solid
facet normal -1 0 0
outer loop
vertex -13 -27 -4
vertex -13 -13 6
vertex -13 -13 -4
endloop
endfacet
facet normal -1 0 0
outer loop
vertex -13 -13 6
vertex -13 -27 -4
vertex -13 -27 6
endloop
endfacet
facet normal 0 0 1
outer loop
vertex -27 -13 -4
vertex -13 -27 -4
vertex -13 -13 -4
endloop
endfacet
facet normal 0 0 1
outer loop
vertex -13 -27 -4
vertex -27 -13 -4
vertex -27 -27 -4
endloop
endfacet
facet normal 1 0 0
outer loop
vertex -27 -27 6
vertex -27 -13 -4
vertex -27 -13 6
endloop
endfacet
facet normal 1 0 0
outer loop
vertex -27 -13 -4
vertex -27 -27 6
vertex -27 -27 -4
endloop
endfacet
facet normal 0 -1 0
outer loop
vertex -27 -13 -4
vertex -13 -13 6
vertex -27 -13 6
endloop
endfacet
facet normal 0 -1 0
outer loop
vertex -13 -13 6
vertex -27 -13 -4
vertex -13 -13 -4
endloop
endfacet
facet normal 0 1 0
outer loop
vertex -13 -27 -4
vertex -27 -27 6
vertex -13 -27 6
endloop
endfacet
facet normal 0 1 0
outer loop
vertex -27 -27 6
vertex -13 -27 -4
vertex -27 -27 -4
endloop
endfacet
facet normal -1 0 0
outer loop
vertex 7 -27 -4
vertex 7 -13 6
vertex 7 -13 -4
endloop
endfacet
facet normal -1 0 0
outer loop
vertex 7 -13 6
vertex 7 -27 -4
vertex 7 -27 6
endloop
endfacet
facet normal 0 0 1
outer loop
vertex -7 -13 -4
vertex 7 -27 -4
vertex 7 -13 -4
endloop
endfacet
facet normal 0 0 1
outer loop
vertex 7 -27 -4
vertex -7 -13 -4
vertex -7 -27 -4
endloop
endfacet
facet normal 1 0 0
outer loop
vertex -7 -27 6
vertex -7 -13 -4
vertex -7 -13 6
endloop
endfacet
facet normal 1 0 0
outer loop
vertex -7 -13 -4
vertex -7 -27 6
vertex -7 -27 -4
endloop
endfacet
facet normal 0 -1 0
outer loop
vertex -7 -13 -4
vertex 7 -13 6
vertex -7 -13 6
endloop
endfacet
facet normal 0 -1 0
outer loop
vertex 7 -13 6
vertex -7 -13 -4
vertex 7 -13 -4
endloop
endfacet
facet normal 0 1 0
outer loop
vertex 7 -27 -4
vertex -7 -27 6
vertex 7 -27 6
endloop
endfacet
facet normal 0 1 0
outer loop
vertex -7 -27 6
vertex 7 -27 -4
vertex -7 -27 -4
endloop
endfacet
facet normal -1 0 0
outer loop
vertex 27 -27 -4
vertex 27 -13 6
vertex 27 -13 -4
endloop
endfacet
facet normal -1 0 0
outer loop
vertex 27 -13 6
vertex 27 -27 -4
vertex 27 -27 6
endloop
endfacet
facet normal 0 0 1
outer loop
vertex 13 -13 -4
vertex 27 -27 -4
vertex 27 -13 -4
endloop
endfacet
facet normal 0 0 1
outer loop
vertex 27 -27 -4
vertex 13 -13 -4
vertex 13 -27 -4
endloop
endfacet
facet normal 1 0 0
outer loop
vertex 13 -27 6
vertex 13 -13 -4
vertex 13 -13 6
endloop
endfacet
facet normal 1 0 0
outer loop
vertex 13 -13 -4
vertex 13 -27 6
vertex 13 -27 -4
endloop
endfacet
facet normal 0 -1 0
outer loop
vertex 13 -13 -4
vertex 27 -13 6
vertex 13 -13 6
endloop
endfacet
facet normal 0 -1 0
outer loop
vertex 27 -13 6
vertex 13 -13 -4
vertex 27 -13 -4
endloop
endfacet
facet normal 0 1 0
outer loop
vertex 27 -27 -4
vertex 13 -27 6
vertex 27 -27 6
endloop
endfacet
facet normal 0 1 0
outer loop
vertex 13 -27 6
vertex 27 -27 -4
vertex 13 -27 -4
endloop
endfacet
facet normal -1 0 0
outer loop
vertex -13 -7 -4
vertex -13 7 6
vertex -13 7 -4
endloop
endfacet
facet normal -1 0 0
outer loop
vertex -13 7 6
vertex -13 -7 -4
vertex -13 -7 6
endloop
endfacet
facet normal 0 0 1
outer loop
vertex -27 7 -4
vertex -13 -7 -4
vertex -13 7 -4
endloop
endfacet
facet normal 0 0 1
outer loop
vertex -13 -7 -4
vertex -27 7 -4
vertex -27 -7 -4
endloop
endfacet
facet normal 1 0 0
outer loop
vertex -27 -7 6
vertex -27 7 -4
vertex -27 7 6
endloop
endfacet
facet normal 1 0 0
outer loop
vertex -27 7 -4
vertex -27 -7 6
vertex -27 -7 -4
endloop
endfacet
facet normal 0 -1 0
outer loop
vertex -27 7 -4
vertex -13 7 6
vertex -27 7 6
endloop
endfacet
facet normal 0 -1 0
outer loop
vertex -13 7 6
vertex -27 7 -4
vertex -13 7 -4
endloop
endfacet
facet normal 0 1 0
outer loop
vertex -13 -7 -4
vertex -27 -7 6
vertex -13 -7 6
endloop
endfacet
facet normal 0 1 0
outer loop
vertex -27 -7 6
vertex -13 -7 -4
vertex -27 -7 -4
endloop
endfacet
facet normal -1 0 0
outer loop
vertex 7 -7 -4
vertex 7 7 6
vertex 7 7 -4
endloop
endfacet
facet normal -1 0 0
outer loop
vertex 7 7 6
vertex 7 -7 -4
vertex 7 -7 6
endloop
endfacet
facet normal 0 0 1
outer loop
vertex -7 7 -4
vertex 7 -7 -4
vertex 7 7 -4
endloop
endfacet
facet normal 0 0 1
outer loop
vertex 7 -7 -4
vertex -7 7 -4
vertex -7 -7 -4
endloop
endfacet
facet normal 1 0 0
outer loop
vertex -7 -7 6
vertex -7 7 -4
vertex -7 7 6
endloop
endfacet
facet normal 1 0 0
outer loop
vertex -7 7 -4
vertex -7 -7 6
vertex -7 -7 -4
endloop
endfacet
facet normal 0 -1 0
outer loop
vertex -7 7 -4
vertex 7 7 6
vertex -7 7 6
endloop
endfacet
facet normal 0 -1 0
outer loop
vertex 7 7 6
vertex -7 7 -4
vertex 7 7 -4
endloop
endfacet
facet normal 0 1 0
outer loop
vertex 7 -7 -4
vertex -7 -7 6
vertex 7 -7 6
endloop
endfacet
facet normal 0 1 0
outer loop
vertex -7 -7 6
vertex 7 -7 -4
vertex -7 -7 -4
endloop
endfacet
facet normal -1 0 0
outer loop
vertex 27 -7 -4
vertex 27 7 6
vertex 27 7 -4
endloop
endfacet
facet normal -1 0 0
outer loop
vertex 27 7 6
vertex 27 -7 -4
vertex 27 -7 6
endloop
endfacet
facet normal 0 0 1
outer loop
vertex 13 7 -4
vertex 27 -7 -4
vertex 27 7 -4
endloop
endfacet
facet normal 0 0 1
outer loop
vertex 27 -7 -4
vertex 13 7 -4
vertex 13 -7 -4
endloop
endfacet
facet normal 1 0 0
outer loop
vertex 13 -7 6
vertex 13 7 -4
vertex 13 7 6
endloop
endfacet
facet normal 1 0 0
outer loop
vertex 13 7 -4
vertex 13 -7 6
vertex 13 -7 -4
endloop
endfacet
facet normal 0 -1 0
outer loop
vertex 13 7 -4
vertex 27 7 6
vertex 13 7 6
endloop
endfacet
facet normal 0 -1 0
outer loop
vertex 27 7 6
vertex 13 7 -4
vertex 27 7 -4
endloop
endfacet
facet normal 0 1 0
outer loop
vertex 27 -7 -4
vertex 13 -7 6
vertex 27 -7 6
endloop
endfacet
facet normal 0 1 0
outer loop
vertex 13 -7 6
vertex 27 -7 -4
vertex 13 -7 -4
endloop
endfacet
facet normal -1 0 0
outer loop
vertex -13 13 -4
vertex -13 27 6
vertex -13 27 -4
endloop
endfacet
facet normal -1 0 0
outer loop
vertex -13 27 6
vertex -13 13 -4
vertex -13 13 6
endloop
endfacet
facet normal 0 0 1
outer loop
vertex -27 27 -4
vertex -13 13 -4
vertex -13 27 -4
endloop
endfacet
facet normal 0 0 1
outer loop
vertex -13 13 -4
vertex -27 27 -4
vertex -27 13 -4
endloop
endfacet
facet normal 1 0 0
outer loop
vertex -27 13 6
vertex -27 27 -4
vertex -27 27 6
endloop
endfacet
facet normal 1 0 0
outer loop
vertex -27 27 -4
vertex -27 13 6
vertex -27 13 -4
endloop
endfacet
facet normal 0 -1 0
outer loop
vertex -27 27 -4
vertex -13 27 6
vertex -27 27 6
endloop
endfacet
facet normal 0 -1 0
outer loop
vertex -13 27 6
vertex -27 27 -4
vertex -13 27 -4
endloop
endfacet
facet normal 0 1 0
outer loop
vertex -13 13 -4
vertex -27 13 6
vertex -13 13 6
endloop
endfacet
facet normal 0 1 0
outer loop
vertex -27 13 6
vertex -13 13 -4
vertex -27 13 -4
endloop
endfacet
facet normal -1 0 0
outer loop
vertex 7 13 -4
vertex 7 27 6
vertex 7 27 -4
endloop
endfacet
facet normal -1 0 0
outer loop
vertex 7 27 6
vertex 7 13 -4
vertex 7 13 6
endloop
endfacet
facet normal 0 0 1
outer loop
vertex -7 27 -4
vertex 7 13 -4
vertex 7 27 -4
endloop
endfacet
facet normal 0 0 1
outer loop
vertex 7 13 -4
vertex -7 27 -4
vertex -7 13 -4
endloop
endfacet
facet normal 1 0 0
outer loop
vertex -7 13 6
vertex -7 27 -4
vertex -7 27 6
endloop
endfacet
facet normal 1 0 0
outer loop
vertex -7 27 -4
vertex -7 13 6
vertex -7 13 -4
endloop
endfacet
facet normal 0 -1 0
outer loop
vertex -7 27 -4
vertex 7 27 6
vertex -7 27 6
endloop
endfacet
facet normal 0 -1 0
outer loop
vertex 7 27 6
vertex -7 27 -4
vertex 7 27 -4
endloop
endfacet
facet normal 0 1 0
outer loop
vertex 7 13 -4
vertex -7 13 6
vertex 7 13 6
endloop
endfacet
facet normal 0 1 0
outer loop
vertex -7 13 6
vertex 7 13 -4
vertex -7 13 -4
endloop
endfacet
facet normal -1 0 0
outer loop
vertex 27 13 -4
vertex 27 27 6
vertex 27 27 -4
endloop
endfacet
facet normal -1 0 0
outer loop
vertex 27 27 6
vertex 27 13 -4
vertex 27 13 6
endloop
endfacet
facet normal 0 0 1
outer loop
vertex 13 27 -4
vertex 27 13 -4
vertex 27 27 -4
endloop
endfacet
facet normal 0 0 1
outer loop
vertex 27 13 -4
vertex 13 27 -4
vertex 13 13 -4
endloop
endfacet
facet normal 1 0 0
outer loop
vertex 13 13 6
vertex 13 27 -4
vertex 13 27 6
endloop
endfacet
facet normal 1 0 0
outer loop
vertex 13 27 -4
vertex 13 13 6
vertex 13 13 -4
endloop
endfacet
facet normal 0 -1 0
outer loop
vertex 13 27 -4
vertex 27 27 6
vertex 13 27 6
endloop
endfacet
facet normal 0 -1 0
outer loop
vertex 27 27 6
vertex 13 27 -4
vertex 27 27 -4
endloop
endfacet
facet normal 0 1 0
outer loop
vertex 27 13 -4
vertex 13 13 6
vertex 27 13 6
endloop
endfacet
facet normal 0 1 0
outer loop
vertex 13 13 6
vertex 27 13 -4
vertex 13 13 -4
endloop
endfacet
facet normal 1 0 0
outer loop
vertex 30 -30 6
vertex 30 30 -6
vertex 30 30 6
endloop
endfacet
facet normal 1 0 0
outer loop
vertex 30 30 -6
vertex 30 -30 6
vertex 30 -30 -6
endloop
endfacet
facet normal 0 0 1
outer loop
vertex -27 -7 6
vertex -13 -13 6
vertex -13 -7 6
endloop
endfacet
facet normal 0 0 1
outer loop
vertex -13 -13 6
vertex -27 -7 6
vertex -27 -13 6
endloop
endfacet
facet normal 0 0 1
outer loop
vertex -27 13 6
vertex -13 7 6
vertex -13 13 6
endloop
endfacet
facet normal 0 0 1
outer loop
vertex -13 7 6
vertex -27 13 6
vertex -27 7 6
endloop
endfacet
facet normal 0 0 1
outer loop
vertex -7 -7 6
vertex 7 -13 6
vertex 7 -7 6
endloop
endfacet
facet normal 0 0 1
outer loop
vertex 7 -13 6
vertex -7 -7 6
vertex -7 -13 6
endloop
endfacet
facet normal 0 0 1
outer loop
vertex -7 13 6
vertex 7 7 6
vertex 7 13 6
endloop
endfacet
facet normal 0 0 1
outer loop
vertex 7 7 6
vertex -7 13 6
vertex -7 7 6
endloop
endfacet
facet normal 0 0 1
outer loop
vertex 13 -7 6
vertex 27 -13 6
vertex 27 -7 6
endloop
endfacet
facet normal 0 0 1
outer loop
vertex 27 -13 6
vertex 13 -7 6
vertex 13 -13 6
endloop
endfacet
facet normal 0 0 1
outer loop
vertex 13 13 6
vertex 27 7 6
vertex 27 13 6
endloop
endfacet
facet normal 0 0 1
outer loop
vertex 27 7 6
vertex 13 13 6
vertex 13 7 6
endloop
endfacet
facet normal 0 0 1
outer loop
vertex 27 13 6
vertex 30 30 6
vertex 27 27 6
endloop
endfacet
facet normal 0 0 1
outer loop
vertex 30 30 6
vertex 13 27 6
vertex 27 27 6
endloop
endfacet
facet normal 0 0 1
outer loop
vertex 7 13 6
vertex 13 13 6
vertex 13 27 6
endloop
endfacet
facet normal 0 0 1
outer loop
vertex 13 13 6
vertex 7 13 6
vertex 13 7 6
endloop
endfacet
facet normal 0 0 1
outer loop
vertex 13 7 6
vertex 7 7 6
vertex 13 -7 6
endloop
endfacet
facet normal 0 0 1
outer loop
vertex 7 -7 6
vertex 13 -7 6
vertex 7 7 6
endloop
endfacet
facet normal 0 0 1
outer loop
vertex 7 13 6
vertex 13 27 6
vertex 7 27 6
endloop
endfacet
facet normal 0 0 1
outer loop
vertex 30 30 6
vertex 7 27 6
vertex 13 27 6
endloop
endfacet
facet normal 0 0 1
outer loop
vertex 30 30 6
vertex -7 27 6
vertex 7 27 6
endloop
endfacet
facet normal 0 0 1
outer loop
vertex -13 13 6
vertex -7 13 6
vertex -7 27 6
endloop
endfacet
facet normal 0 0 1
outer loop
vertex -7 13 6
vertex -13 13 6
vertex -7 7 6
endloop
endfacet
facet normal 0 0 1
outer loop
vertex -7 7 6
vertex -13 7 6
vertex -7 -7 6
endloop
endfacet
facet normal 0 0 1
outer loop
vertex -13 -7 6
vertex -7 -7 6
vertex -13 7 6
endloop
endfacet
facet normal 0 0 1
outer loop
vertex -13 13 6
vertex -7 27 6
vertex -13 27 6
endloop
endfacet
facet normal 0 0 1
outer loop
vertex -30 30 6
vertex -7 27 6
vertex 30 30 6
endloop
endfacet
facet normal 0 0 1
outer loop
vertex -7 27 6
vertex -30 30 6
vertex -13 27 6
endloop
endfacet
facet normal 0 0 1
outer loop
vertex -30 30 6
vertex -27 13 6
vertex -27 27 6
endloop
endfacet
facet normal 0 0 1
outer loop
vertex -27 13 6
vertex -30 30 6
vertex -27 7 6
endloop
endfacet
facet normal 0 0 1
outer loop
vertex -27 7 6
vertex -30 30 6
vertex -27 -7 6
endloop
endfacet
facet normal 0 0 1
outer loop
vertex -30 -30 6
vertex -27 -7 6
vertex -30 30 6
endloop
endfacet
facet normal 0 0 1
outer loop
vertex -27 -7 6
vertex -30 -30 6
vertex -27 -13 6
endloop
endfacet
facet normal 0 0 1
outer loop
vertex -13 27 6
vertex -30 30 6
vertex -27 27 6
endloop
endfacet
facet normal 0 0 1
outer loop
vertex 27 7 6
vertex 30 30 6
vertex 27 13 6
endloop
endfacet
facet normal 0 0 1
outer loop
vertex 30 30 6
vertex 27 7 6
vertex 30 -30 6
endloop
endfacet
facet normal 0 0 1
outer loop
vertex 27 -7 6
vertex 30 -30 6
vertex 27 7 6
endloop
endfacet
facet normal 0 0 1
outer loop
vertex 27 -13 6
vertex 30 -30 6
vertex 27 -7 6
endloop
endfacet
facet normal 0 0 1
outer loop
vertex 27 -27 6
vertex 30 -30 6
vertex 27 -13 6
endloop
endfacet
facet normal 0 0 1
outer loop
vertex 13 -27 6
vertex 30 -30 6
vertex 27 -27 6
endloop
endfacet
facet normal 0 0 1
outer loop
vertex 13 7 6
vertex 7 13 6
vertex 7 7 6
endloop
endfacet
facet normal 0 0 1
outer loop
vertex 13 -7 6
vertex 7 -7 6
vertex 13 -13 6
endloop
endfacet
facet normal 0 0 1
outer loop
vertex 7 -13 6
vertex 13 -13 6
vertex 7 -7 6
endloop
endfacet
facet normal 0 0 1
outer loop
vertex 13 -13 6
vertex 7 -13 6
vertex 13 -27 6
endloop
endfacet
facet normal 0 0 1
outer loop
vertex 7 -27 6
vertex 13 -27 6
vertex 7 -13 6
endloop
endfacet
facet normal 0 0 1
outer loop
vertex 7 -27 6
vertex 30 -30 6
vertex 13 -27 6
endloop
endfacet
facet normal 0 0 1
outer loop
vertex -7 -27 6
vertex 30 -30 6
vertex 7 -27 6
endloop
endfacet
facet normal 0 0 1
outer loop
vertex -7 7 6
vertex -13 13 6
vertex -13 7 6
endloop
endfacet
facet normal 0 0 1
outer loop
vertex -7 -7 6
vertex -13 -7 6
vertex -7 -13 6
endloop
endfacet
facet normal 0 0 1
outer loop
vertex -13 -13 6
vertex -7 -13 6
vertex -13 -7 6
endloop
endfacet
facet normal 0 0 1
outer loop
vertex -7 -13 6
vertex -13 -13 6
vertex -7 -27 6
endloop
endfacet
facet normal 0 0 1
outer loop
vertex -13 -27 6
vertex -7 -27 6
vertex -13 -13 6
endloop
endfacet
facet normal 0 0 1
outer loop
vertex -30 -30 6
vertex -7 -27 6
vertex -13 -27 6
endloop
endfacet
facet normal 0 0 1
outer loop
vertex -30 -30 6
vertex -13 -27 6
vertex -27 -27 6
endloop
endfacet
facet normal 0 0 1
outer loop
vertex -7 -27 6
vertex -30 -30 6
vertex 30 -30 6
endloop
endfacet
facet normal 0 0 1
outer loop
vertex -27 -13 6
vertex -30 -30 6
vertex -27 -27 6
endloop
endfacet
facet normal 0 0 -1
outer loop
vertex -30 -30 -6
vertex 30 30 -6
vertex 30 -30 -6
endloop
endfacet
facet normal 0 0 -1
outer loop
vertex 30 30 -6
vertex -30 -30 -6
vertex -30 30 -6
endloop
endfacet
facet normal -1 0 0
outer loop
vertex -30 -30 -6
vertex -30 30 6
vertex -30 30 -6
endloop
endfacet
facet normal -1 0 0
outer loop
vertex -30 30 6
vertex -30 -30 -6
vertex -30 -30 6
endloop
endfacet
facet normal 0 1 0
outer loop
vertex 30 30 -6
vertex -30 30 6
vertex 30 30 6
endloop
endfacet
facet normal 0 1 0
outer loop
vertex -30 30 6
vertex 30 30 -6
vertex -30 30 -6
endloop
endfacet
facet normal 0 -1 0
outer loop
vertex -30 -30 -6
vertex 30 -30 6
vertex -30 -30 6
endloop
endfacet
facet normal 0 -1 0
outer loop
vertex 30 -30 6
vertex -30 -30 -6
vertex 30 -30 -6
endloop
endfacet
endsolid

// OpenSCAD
$fn = 32;

// ----------------------------------------------------------------------
// Pocket plate 60 x 60 x 12
// 3 x 3 pockets 14 mm square, 10 mm deep
// ----------------------------------------------------------------------

// --- parameters (mm) ---
thickness = 12;  // plate thickness
floor_t = 2;     // material left under each pocket
pocket = 14;     // pocket side length
pitch_x = 20;    // pocket pitch along X
pitch_y = 20;    // pocket pitch along Y
cols = 3;        // pockets per row
rows = 3;        // rows of pockets

// --- derived feature positions (mm) ---
depth = thickness - floor_t;        // = 10   pocket depth, down to the floor
span_x = (cols - 1) * pitch_x;      // = 40   distance between outer pockets
span_y = (rows - 1) * pitch_y;      // = 40   distance between outer pocket rows
origin_x = -span_x / 2;             // = -20   X of the first pocket
origin_y = -span_y / 2;             // = -20   Y of the first pocket
plate = [span_x + pocket + 6, span_y + pocket + 6, thickness];  // = [60, 60, 12]   overall size: pockets plus 3 mm of wall on each side
feature_centers = [
  [origin_x + 0 * pitch_x, origin_y + 0 * pitch_y],
  [origin_x + 1 * pitch_x, origin_y + 0 * pitch_y],
  [origin_x + 2 * pitch_x, origin_y + 0 * pitch_y],
  [origin_x + 0 * pitch_x, origin_y + 1 * pitch_y],
  [origin_x + 1 * pitch_x, origin_y + 1 * pitch_y],
  [origin_x + 2 * pitch_x, origin_y + 1 * pitch_y],
  [origin_x + 0 * pitch_x, origin_y + 2 * pitch_y],
  [origin_x + 1 * pitch_x, origin_y + 2 * pitch_y],
  [origin_x + 2 * pitch_x, origin_y + 2 * pitch_y]
];   // pocket centres, used verbatim by the cutter loop

// plate outline, then one pocket per centre in feature_centers
difference() {
  cube(plate, center = true);
  for (centre = feature_centers)
    translate([centre[0] - pocket / 2, centre[1] - pocket / 2, plate[2] / 2 - depth])
      cube([pocket, pocket, depth + 1]);  // centred on the declared pocket centre
}
